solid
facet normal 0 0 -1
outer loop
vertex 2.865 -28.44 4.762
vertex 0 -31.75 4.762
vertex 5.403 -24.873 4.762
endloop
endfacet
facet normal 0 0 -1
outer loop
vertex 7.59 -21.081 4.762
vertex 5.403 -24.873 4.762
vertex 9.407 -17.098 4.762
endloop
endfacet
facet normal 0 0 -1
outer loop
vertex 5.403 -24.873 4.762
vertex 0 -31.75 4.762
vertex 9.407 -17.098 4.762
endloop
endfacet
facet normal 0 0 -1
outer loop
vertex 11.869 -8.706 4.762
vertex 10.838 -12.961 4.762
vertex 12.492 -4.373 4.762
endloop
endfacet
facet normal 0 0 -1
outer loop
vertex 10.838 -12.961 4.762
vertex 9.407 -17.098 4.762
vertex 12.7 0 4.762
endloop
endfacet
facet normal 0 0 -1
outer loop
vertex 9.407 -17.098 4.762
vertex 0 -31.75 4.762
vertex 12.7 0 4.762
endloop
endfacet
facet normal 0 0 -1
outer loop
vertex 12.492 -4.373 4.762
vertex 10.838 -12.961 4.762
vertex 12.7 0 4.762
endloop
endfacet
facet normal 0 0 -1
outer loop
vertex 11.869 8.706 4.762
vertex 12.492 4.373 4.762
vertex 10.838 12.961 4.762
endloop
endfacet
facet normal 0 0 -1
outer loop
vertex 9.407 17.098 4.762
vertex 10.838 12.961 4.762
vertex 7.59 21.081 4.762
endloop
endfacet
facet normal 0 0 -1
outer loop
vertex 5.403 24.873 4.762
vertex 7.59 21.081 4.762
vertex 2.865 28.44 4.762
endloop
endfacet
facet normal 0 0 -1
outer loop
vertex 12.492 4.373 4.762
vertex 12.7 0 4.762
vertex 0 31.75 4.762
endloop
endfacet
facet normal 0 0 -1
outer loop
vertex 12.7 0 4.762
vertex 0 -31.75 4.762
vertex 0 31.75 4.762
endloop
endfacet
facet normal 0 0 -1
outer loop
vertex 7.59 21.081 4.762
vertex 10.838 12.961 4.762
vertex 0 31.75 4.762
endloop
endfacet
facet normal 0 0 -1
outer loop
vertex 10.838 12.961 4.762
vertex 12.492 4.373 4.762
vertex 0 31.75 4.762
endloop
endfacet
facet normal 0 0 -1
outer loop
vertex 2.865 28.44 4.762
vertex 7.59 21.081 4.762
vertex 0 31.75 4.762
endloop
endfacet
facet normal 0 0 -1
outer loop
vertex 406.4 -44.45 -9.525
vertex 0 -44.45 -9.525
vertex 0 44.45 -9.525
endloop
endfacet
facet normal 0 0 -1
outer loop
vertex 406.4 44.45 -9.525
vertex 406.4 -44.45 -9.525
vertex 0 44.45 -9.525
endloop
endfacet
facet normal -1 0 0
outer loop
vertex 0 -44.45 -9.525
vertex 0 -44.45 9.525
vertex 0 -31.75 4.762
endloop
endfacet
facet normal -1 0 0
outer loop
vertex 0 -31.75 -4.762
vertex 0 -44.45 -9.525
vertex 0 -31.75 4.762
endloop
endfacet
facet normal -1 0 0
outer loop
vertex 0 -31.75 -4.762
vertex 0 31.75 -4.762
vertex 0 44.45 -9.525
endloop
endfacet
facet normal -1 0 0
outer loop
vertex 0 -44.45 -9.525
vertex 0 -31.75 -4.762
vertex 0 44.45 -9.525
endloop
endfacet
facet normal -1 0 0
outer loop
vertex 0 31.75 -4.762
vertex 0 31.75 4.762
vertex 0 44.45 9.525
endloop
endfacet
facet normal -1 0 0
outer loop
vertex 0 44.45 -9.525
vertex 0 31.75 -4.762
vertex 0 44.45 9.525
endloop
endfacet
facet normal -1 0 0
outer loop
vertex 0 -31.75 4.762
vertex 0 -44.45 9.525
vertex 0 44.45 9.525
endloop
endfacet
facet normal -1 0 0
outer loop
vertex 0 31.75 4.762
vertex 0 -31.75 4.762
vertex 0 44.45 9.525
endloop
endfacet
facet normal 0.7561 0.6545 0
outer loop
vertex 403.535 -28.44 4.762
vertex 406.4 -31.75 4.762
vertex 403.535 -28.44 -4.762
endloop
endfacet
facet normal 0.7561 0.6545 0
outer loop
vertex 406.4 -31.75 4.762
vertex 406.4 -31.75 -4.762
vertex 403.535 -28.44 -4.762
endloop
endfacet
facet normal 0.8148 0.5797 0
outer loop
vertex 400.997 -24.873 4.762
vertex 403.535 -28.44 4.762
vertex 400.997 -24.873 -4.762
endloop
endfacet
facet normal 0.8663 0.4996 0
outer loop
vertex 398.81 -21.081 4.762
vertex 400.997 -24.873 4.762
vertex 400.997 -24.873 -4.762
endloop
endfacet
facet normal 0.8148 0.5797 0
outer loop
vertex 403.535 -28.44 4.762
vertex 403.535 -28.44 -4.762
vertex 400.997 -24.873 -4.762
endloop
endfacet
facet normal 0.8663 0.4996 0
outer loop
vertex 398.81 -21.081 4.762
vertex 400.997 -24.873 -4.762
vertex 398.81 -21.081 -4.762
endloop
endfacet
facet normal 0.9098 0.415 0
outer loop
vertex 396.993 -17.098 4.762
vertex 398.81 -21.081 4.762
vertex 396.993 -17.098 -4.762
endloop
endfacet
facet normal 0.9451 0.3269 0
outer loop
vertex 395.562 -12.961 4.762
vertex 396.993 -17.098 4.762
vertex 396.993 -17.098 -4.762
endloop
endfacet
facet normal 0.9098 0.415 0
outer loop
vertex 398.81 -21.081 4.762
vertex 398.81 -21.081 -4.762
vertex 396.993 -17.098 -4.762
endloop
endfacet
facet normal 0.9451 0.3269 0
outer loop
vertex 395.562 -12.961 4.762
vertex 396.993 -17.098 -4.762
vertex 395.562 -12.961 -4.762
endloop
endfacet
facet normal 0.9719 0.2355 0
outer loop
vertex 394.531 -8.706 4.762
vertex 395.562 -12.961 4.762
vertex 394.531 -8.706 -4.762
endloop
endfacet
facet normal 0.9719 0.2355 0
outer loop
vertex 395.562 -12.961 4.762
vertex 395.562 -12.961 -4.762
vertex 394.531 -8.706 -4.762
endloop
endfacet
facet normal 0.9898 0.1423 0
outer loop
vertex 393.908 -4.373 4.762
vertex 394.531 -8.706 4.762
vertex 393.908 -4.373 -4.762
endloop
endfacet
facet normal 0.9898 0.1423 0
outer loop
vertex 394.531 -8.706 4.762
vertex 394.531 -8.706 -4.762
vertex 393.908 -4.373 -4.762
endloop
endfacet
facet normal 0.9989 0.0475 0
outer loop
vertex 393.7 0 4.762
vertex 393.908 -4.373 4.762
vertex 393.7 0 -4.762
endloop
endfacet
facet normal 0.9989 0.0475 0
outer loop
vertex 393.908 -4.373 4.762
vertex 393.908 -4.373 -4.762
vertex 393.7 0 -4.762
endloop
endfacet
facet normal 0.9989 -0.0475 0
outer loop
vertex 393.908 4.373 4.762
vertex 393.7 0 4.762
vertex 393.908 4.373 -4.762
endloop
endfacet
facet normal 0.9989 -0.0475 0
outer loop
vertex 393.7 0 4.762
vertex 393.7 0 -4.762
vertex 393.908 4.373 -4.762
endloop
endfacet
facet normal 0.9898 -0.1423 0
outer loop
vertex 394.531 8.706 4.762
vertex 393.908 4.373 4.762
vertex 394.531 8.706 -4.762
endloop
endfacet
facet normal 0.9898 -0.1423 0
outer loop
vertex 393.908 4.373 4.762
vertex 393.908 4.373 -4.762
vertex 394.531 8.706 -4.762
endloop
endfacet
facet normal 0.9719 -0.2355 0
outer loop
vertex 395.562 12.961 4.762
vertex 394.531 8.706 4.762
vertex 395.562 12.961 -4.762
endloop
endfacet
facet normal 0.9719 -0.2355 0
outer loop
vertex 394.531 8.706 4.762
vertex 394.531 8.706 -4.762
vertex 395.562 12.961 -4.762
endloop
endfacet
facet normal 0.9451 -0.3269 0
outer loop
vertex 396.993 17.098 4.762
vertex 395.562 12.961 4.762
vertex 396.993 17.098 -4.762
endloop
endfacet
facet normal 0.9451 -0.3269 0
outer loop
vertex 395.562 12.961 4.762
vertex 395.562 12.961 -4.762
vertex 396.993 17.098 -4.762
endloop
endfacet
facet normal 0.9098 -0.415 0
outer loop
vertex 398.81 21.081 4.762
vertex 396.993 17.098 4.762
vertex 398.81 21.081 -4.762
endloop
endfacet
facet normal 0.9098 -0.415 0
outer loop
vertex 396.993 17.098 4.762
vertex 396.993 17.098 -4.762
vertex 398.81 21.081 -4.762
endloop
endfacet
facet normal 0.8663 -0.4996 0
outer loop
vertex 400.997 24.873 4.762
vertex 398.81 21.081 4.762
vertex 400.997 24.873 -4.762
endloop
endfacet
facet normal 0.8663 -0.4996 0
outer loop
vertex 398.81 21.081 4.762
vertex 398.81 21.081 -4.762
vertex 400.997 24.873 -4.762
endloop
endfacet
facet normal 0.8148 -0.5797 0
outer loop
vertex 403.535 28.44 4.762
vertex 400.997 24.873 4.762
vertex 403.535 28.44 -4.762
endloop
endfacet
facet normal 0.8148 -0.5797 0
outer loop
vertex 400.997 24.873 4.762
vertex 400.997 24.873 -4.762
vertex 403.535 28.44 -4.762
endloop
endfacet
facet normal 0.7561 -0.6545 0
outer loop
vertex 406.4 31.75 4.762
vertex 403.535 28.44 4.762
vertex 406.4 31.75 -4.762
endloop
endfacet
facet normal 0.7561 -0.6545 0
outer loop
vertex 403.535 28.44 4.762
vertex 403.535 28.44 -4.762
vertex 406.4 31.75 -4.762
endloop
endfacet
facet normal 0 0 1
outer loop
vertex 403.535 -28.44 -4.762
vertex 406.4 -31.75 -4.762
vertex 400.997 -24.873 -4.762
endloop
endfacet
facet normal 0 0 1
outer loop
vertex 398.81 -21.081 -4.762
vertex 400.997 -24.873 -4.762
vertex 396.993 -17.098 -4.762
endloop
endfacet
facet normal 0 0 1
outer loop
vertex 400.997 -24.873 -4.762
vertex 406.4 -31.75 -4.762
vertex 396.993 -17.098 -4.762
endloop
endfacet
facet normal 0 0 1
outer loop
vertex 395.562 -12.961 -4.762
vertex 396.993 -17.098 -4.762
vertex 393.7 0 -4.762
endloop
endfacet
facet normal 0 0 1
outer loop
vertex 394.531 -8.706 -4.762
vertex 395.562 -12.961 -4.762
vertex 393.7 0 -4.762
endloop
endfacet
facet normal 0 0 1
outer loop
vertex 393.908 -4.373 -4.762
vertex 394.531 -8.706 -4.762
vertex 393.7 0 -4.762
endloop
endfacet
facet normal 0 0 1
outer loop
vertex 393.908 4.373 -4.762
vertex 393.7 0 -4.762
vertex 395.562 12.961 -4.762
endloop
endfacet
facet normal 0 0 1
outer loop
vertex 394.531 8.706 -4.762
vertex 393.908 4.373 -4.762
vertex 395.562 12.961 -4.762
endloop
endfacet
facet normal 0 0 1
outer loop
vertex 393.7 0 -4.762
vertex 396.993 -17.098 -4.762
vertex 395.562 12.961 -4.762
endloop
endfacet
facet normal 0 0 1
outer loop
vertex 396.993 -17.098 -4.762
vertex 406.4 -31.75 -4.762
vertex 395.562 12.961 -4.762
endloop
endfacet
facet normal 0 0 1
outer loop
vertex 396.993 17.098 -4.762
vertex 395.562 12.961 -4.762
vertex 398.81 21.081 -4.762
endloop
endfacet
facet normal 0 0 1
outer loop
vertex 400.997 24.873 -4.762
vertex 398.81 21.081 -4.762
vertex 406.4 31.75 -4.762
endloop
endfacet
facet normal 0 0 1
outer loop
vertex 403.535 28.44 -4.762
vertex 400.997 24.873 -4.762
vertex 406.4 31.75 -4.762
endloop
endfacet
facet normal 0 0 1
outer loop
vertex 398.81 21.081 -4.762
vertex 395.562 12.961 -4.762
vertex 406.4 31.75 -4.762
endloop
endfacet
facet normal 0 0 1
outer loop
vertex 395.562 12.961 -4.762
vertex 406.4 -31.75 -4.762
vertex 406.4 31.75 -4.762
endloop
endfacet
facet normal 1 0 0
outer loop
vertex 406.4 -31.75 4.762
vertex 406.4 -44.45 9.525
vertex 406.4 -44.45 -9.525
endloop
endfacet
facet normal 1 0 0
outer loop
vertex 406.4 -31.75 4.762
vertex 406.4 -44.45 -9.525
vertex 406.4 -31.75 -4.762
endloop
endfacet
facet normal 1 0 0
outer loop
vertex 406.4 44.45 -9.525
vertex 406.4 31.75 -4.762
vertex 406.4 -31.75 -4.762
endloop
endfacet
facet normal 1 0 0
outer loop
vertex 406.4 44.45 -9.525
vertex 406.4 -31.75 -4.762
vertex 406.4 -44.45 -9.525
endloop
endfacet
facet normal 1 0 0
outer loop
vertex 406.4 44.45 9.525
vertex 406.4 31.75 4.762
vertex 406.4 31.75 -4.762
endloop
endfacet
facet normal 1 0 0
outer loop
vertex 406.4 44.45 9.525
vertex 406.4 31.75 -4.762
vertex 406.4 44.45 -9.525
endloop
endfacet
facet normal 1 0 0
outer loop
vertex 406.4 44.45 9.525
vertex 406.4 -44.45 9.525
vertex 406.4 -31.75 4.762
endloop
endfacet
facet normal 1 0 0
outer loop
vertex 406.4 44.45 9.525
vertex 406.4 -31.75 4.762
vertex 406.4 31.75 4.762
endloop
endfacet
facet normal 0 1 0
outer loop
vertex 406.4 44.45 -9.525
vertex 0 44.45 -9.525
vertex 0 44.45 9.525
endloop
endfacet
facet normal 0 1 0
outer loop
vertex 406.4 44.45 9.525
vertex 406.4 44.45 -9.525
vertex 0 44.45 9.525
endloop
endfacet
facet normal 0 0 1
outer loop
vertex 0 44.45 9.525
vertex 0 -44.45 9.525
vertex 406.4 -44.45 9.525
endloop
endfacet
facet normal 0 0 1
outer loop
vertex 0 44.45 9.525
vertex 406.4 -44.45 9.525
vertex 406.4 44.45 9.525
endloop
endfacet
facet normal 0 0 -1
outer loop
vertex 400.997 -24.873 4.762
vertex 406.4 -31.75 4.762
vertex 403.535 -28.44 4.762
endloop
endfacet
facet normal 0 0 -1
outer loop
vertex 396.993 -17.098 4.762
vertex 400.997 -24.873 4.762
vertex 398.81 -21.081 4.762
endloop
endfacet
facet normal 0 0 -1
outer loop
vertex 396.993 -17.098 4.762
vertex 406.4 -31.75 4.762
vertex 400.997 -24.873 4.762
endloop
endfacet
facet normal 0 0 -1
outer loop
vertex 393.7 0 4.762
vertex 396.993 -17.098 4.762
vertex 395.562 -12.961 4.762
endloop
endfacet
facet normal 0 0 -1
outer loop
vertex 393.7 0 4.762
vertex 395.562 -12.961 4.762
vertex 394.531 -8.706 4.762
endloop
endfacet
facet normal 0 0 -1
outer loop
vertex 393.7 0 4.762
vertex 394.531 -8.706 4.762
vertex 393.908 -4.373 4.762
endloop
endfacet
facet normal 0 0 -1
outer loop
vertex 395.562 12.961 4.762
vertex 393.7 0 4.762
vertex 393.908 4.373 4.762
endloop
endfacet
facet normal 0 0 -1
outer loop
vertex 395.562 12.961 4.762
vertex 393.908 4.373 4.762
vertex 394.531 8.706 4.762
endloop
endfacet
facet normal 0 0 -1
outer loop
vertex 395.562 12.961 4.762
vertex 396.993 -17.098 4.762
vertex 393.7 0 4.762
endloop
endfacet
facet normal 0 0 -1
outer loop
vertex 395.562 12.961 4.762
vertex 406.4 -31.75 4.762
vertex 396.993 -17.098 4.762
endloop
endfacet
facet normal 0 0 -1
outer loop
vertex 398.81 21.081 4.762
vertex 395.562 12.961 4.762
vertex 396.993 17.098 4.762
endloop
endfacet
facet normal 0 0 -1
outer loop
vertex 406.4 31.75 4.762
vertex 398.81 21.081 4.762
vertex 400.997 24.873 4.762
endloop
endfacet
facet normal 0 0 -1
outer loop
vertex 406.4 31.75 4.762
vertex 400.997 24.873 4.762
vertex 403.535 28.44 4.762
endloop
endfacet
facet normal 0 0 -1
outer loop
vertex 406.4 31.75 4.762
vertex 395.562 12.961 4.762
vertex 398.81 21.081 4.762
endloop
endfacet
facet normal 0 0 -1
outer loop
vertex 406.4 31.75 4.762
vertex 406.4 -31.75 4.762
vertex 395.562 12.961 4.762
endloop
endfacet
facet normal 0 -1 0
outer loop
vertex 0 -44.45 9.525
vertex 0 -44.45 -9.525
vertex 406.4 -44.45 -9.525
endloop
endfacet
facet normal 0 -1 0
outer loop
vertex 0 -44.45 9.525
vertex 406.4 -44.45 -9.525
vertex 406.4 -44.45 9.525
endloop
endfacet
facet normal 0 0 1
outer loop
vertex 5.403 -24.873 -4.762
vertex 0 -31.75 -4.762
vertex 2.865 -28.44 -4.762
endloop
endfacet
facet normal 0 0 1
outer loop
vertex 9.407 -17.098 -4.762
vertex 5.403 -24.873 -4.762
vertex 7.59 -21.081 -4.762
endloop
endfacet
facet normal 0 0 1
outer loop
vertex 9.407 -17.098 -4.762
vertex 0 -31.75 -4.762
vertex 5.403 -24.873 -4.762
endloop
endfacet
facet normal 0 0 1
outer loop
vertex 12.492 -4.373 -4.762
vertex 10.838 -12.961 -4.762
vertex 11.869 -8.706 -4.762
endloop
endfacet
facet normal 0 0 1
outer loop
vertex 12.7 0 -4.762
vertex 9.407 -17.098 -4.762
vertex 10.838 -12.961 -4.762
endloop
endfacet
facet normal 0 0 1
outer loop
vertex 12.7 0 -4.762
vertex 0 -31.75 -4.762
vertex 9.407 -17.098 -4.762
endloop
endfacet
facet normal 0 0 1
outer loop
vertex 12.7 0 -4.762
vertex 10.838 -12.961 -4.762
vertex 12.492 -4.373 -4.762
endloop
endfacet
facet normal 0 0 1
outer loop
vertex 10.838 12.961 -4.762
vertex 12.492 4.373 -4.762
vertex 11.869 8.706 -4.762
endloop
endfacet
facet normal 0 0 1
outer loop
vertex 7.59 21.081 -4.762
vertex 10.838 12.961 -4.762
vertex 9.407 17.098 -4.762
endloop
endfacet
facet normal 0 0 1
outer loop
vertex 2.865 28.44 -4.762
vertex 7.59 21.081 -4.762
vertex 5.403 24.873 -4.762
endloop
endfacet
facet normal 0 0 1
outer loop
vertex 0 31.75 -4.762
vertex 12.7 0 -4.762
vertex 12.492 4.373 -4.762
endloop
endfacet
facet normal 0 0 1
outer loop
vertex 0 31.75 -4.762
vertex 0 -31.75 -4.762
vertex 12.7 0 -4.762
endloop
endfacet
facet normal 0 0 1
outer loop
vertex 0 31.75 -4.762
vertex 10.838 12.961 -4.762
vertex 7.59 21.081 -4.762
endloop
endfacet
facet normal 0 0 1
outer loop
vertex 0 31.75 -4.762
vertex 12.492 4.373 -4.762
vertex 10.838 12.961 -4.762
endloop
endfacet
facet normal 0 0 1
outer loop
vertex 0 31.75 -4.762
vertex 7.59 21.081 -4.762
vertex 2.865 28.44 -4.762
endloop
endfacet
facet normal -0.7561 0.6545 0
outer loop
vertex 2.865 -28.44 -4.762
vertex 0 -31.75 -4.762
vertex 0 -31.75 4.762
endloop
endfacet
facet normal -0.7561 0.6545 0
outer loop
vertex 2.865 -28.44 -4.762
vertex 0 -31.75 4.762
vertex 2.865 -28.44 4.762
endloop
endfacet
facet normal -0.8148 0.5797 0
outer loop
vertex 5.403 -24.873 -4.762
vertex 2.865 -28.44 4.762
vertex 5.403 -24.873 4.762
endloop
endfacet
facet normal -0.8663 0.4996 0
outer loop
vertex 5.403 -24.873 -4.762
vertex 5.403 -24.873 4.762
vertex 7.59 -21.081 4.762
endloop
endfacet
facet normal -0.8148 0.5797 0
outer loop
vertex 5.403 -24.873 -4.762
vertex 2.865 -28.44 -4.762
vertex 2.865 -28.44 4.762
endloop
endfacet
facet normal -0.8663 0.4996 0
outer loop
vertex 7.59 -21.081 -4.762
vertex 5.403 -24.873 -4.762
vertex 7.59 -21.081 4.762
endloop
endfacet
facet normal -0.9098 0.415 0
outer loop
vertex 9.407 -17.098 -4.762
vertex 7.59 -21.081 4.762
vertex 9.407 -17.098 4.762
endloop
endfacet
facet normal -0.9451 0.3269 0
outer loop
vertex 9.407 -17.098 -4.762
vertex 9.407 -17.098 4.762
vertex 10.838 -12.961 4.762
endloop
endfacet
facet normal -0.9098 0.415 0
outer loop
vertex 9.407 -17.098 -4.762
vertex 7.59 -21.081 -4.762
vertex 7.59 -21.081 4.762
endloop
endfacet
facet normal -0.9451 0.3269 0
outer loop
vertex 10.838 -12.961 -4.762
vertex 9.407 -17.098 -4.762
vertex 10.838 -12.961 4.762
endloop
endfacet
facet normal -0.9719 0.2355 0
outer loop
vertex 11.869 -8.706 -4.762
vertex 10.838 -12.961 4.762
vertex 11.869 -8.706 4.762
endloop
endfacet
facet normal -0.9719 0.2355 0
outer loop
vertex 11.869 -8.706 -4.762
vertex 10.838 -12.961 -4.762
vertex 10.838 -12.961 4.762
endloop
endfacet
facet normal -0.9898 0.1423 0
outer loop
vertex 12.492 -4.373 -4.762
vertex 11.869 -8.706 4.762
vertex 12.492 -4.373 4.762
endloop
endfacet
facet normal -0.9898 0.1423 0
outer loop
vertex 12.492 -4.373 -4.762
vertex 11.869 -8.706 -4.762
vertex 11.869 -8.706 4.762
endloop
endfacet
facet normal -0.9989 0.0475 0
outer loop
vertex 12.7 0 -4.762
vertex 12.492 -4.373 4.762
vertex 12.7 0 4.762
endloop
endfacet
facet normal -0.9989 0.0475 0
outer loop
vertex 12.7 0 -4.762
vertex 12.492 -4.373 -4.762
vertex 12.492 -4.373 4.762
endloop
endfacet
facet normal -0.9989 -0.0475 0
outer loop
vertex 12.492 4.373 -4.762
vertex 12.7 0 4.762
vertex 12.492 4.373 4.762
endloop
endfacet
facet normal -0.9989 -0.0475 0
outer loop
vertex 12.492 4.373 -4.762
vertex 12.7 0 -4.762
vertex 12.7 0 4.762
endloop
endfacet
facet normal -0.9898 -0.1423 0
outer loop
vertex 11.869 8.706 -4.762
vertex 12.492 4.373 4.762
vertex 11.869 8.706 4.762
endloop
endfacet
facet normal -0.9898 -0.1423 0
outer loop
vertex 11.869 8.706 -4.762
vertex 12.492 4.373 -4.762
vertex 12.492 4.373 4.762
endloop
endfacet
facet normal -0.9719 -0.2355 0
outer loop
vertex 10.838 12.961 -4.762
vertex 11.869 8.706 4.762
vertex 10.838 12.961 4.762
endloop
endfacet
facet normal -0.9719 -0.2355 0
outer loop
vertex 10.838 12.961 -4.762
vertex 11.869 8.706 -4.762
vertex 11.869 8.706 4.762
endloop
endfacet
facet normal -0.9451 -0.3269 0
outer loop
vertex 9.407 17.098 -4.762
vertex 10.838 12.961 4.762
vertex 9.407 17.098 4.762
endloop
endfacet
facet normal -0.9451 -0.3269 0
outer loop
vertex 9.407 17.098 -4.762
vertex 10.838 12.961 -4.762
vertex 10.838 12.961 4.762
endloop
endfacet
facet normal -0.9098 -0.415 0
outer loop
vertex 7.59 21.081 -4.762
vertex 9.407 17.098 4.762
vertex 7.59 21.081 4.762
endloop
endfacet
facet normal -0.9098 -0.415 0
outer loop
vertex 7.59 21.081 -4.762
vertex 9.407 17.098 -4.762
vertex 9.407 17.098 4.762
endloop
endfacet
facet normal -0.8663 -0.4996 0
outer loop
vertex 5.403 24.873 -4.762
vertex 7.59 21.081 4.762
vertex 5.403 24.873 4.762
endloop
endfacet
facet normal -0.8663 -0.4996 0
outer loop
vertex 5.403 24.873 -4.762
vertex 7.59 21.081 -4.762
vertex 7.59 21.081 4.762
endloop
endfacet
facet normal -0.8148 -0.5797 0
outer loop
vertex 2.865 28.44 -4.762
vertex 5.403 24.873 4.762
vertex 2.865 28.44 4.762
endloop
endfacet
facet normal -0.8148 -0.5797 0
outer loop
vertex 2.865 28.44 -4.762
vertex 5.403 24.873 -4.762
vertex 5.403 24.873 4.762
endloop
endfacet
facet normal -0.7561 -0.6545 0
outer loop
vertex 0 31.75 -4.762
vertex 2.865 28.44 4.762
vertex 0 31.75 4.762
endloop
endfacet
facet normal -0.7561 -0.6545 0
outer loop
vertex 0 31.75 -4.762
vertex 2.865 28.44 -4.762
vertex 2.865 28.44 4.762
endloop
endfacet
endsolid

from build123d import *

# Parameters (mm, degrees)
F0_W          = 88.9
F0_H          = 19.05
F1_DEPTH      = 406.4
F3_DEPTH      = 4.7625
F3_DEPTH_BACK = 4.7625


# Not quite as in the source:
# - a pattern or mirror of a feature is missing from the dataset's text; its kind, count and spacing are read off the source's solid


with BuildPart() as f1:
    # F0 (on Right) → F1 (new body)
    with BuildSketch(Plane.YZ):
        Rectangle(F0_W, F0_H)
    extrude(amount=F1_DEPTH)

    # F2 (on Top) → F3 (cut, two sides)
    with BuildSketch(Plane.XY) as f3_sk:
        with BuildLine():
            Line((0, 31.75), (0, -31.75))
            ThreePointArc((0, -31.75), (12.7, 0), (0, 31.75))
        make_face()
    f3 = extrude(amount=F3_DEPTH, mode=Mode.SUBTRACT) + extrude(f3_sk.sketch, amount=-F3_DEPTH_BACK, mode=Mode.SUBTRACT)

    # F3_copies: F3 across plane
    add(f3.mirror(Plane(origin=(203.2, 0, 0), x_dir=(0, 0, 1), z_dir=(1, 0, 0))), mode=Mode.SUBTRACT)


solid = f1.part
